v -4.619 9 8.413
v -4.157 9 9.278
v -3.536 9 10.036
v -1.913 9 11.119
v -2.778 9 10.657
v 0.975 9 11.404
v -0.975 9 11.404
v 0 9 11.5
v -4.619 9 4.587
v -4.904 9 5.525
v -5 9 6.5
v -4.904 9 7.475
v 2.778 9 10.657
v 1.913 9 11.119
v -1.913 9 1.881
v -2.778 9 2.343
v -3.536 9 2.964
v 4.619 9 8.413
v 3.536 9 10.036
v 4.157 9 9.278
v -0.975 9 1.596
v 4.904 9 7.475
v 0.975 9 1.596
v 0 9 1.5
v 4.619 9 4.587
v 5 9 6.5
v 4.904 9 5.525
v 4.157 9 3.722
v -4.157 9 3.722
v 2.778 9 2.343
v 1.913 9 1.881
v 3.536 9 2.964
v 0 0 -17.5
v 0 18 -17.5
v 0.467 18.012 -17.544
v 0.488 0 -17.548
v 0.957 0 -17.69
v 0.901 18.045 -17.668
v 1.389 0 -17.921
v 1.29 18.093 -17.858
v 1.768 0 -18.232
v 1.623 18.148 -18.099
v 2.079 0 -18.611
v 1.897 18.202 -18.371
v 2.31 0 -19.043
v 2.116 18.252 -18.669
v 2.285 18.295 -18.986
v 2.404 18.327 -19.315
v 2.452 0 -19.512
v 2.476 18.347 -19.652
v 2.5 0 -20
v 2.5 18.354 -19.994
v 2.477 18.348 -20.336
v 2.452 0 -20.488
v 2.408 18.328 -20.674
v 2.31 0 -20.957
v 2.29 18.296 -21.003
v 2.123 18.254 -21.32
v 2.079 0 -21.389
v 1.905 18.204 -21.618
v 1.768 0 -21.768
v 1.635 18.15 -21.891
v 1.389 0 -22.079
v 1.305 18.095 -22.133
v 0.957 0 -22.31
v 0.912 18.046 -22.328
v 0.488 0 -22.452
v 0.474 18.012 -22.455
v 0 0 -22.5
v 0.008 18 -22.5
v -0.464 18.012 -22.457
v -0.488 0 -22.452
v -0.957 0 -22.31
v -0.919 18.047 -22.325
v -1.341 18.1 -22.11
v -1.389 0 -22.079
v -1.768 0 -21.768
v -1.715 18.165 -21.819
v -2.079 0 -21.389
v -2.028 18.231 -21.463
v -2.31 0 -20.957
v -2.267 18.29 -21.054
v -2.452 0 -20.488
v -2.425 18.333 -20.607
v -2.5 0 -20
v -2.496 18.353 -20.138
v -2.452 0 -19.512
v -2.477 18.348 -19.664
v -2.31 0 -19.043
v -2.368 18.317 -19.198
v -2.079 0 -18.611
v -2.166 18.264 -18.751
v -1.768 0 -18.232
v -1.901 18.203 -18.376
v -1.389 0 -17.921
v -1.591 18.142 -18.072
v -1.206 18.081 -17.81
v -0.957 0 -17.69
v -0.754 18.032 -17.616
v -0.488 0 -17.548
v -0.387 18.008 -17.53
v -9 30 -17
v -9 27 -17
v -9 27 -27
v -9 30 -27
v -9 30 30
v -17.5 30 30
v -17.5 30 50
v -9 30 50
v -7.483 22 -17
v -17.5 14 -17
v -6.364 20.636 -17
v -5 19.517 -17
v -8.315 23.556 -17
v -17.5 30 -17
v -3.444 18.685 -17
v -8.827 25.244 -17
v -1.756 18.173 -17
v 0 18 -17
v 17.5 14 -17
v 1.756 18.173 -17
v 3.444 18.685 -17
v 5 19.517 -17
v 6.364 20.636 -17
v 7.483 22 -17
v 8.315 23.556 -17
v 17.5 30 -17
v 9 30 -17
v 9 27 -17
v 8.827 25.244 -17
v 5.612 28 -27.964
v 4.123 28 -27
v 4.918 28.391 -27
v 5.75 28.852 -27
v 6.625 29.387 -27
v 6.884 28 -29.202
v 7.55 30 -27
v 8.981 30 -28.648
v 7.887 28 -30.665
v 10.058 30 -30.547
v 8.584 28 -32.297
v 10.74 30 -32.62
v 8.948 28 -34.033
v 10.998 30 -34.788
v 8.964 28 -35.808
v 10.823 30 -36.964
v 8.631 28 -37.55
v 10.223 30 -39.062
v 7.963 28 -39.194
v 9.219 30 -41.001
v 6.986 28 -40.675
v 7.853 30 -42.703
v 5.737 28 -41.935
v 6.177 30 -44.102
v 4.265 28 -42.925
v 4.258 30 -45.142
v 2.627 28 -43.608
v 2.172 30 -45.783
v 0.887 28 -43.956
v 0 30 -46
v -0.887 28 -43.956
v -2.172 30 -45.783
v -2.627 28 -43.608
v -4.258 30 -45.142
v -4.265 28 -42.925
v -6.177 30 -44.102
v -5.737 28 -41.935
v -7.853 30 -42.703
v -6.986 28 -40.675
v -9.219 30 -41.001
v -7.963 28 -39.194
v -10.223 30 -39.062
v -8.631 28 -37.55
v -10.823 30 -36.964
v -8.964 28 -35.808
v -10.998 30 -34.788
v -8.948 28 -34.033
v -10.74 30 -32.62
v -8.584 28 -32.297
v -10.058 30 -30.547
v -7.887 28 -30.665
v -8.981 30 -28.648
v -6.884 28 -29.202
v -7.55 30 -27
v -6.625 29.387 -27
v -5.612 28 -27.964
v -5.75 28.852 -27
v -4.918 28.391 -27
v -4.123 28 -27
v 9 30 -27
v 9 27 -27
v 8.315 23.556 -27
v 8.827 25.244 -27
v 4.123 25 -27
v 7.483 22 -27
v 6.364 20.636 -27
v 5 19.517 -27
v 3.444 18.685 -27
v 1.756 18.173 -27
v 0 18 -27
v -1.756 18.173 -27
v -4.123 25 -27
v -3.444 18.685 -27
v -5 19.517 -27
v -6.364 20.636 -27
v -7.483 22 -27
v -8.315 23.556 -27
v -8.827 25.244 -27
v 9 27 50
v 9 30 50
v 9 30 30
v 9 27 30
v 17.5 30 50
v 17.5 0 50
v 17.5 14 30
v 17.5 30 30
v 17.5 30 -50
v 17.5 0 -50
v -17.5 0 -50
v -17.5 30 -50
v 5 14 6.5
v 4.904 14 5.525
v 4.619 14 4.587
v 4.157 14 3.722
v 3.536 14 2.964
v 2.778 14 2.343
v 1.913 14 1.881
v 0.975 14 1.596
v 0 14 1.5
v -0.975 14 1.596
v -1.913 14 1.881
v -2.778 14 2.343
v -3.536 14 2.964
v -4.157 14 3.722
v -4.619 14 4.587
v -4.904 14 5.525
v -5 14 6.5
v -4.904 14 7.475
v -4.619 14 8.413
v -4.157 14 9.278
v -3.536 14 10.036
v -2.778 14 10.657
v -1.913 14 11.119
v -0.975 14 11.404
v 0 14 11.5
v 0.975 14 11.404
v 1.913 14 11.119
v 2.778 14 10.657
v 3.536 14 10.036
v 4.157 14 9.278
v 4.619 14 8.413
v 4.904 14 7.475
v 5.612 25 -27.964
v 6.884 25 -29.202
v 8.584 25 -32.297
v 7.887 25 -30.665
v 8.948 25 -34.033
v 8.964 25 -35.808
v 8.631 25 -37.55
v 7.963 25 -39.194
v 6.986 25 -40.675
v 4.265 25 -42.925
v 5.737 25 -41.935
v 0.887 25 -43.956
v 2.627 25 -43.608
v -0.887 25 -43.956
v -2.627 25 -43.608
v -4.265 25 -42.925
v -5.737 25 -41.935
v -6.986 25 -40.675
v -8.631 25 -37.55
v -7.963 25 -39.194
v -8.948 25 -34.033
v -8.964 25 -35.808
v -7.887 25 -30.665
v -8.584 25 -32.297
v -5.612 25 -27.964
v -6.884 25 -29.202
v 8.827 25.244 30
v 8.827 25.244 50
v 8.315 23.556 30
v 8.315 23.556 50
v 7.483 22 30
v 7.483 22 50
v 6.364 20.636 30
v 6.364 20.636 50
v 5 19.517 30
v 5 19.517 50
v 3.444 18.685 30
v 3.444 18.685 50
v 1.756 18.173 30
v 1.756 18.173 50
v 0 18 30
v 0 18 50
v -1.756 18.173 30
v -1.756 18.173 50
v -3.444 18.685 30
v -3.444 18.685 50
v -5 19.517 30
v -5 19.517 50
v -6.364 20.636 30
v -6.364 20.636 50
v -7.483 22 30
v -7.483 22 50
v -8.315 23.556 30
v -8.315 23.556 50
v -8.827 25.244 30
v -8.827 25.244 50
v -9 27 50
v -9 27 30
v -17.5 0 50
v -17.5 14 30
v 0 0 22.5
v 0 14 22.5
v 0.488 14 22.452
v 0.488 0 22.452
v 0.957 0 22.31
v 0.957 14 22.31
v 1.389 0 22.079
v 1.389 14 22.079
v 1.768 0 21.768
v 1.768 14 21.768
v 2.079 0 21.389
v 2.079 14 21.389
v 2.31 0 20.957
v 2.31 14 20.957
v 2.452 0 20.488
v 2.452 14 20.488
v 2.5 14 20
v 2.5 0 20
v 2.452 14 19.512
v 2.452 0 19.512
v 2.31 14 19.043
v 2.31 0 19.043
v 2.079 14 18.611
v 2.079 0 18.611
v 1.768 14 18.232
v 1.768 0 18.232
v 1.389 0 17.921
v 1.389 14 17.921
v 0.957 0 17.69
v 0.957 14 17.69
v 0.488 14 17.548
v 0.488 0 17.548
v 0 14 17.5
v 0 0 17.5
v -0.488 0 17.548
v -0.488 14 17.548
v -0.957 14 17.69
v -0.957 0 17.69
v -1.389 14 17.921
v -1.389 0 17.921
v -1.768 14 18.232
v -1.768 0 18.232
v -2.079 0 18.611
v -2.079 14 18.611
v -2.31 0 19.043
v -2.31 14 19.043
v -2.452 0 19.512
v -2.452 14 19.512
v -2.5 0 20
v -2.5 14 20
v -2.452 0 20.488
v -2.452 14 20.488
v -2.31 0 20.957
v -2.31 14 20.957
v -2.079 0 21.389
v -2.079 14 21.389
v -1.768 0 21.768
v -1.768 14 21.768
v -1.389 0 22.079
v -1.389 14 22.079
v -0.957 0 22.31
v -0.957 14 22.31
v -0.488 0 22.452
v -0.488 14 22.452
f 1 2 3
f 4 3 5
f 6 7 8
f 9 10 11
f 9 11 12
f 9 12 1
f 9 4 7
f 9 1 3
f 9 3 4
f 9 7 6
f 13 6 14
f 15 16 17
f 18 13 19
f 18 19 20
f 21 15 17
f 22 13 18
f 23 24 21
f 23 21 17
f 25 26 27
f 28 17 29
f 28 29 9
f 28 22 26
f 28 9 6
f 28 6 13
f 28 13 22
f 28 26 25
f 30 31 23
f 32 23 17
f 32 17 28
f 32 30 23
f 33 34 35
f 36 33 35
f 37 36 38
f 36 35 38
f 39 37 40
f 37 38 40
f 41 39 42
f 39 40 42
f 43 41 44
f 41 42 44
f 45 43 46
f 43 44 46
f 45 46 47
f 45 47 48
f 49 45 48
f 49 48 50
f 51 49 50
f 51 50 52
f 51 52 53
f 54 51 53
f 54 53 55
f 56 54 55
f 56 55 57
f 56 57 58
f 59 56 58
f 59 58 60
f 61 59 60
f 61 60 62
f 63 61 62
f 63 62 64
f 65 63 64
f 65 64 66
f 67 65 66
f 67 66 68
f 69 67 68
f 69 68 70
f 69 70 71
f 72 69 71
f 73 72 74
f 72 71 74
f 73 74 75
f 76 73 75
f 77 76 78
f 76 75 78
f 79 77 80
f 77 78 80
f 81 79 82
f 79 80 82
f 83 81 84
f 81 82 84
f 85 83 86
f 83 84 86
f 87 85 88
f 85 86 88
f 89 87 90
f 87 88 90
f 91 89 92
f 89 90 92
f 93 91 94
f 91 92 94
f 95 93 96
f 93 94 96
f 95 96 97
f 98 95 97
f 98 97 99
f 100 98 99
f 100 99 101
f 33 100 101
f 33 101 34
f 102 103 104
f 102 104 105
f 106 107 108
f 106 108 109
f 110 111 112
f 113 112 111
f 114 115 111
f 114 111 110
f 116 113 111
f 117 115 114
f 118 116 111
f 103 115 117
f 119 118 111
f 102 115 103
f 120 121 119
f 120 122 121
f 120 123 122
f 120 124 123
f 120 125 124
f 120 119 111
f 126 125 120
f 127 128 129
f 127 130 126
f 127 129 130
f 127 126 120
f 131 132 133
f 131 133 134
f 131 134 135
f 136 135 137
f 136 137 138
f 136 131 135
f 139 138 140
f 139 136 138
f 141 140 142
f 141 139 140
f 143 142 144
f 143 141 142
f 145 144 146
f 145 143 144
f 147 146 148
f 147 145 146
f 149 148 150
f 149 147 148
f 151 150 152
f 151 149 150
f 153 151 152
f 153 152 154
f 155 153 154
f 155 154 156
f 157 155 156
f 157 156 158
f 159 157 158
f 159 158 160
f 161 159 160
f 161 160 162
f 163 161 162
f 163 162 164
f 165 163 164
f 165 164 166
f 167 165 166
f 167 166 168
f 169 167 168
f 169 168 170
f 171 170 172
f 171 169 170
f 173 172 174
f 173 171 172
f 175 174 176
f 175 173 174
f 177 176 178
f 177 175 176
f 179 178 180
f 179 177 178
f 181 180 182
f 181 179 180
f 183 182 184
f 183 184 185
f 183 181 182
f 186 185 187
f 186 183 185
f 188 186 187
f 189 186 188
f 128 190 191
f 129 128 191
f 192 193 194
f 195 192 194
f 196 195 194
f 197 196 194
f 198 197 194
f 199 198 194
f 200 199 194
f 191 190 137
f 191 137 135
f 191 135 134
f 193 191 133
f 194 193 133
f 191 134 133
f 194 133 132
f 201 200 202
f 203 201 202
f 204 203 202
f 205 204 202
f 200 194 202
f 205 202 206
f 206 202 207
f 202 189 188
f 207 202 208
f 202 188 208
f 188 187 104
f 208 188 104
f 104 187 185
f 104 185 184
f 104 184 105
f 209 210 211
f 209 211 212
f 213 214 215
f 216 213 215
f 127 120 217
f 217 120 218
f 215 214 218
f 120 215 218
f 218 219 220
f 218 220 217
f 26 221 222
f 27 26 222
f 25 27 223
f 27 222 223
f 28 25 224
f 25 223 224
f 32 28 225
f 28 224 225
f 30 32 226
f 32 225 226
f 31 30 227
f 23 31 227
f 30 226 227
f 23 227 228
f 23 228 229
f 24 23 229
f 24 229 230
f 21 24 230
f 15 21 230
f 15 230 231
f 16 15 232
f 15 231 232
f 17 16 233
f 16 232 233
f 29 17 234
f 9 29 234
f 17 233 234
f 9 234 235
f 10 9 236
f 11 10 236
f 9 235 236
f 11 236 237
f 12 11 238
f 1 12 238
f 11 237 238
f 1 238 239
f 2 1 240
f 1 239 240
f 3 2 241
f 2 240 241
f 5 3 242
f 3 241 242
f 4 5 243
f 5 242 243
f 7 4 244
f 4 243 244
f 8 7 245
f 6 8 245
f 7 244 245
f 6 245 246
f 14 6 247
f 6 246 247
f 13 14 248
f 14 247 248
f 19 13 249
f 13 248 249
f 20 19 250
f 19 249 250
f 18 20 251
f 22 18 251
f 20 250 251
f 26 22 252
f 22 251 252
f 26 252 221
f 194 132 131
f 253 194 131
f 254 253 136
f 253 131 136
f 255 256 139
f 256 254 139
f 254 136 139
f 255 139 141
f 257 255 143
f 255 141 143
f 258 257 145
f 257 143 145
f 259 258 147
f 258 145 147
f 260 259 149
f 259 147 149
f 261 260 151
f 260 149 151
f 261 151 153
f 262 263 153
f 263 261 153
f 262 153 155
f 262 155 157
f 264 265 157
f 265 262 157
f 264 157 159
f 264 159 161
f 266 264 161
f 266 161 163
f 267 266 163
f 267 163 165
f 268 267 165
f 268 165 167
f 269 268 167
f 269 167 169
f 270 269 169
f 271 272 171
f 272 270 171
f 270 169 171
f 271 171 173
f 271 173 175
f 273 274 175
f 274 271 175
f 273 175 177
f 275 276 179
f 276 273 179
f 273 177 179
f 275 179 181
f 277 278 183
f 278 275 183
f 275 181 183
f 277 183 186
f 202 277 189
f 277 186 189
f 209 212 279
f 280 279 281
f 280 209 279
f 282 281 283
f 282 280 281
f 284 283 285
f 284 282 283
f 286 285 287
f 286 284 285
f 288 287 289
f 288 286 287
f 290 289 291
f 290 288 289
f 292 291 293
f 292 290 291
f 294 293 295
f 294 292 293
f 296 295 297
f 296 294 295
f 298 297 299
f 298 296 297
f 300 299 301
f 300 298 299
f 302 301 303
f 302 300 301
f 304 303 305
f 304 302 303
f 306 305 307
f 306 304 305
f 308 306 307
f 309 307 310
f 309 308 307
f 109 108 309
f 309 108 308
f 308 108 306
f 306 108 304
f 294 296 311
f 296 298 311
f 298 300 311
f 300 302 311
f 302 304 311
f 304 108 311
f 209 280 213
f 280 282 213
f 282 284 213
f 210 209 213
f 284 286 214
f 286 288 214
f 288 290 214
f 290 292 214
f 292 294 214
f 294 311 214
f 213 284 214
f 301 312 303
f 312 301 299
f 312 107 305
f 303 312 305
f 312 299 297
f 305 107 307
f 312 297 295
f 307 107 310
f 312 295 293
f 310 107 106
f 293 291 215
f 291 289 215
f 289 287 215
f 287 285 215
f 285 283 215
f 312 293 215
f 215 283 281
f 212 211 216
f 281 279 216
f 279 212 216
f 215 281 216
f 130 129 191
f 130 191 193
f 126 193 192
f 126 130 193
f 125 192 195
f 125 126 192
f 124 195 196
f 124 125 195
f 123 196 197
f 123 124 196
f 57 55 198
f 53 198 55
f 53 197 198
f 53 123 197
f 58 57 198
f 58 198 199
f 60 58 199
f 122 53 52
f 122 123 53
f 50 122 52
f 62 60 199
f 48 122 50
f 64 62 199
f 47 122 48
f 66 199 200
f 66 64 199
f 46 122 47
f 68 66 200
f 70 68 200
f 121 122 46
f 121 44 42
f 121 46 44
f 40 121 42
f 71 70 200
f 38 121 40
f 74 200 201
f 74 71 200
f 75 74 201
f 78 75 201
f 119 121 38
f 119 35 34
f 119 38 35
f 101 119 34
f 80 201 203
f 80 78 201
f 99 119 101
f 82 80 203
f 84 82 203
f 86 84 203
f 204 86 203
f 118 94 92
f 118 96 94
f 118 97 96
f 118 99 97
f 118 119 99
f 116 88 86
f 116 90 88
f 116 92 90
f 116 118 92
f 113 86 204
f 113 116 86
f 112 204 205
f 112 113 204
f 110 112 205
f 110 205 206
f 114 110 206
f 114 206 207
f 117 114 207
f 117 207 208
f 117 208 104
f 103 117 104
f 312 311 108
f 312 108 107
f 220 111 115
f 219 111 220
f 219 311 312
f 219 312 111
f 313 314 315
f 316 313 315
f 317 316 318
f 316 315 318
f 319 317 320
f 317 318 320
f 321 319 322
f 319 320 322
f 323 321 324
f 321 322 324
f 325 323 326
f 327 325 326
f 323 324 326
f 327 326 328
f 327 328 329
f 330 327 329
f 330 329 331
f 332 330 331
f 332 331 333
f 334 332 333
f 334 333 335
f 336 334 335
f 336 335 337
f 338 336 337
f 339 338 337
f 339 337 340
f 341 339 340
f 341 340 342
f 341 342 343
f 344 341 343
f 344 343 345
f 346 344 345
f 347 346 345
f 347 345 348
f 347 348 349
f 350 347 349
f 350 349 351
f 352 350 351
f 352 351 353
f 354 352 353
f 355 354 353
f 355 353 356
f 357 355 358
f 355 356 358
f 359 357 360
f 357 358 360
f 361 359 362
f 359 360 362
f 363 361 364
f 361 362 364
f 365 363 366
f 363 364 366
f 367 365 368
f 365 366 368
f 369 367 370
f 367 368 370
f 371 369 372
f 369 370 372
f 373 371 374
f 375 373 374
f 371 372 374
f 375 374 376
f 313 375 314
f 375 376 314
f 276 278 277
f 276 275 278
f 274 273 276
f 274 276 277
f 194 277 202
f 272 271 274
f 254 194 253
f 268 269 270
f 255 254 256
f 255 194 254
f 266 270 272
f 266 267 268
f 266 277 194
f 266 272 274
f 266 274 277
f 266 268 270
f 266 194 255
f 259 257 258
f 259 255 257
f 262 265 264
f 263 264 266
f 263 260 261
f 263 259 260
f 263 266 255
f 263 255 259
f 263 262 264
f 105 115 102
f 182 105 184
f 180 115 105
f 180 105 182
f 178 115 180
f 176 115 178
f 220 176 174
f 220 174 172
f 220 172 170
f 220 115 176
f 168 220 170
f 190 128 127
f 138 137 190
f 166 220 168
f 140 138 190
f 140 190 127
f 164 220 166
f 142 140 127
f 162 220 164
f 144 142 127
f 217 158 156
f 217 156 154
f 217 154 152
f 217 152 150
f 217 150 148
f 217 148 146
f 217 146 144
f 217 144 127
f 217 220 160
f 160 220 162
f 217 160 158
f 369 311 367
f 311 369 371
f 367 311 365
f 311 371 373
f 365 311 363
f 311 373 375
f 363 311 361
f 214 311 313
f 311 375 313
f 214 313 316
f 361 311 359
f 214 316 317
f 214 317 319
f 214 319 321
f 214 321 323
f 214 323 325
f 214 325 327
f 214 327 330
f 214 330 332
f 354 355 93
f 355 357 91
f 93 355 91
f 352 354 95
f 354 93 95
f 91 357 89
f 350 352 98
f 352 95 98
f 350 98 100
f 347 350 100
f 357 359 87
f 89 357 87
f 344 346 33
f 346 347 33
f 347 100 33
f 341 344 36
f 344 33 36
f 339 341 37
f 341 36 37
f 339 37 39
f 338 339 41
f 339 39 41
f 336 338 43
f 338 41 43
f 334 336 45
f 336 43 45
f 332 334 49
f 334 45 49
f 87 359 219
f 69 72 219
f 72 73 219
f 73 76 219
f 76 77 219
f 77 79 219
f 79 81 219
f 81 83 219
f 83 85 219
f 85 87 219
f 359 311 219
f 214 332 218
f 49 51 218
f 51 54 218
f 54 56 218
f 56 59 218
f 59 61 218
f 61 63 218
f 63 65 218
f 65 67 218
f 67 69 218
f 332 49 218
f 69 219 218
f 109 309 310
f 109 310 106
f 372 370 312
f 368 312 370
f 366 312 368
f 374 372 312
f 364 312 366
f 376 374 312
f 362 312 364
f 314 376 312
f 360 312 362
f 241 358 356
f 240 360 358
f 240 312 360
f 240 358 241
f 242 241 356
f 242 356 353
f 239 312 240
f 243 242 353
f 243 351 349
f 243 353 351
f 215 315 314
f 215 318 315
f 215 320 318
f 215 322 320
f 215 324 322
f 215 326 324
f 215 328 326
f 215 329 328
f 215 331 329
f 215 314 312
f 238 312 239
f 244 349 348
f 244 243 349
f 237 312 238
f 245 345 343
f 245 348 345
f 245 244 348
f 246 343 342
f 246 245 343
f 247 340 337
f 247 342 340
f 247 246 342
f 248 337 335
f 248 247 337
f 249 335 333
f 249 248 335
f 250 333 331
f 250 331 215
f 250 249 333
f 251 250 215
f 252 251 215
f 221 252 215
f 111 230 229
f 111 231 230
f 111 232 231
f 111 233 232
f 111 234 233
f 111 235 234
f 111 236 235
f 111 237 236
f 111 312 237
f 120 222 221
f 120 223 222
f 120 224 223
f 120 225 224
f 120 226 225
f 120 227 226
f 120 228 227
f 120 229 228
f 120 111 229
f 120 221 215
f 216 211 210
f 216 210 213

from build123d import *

# Parameters (mm, degrees)
SKETCH_1_W          = 35
SKETCH_1_H          = 100
EXTRUDE_1_DEPTH     = 30
SKETCH_2_R          = 9
CUT_EXTRUDE_1_DEPTH = 5
CHAMFER_1_SIZE      = 2
CUT_EXTRUDE_3_DEPTH = 77
SKETCH_4_W          = 35
SKETCH_4_H          = 47
CUT_EXTRUDE_4_DEPTH = 16
HOLE_WIZARD_M6_1_D  = 5
SKETCH_7_R          = 5
CUT_EXTRUDE_5_DEPTH = 5


with BuildPart() as part:
    # 草图1 → 凸台-拉伸1 (new body)
    with BuildSketch(Plane(origin=(0, 0, 0), x_dir=(1, 0, 0), z_dir=(0, 1, 0))):
        Rectangle(SKETCH_1_W, SKETCH_1_H)
    extrude(amount=EXTRUDE_1_DEPTH)

    # 草图2 → 切除-拉伸1 (cut)
    with BuildSketch(Plane(origin=(0, 30, 0), x_dir=(1, 0, 0), z_dir=(0, 1, 0))):
        with Locations((0, 35)):
            Circle(SKETCH_2_R)
    extrude(amount=-CUT_EXTRUDE_1_DEPTH, mode=Mode.SUBTRACT)

    # 倒角1
    chamfer_1_edges = [part.edges().sort_by_distance(p)[0] for p in [
        (-9, 30, -35),
    ]]
    chamfer(chamfer_1_edges, length=CHAMFER_1_SIZE)

    # 草图3 → 切除-拉伸3 (cut)
    with BuildSketch(Plane.XY.offset(50)):
        with BuildLine():
            Line((9, 33), (9, 27))
            ThreePointArc((9, 27), (0, 18), (-9, 27))
            Line((-9, 27), (-9, 33))
            ThreePointArc((-9, 33), (0, 42), (9, 33))
        make_face()
    extrude(amount=-CUT_EXTRUDE_3_DEPTH, mode=Mode.SUBTRACT)

    # 草图4 → 切除-拉伸4 (cut)
    with BuildSketch(Plane(origin=(0, 30, 0), x_dir=(1, 0, 0), z_dir=(0, 1, 0))):
        with Locations((0, -6.5)):
            Rectangle(SKETCH_4_W, SKETCH_4_H)
    extrude(amount=-CUT_EXTRUDE_4_DEPTH, mode=Mode.SUBTRACT)

    # M6 螺纹孔1 (through all)
    with Locations(Plane(origin=(0, 0, -20), x_dir=(0, 0, -1), z_dir=(0, -1, 0))):
        with Locations((0, 0), (-40, 0)):
            Hole(HOLE_WIZARD_M6_1_D / 2)

    # 草图7 → 切除-拉伸5 (cut)
    with BuildSketch(Plane(origin=(0, 14, 0), x_dir=(1, 0, 0), z_dir=(0, 1, 0))):
        with Locations((0, -6.5)):
            Circle(SKETCH_7_R)
    extrude(amount=-CUT_EXTRUDE_5_DEPTH, mode=Mode.SUBTRACT)


solid = part.part
